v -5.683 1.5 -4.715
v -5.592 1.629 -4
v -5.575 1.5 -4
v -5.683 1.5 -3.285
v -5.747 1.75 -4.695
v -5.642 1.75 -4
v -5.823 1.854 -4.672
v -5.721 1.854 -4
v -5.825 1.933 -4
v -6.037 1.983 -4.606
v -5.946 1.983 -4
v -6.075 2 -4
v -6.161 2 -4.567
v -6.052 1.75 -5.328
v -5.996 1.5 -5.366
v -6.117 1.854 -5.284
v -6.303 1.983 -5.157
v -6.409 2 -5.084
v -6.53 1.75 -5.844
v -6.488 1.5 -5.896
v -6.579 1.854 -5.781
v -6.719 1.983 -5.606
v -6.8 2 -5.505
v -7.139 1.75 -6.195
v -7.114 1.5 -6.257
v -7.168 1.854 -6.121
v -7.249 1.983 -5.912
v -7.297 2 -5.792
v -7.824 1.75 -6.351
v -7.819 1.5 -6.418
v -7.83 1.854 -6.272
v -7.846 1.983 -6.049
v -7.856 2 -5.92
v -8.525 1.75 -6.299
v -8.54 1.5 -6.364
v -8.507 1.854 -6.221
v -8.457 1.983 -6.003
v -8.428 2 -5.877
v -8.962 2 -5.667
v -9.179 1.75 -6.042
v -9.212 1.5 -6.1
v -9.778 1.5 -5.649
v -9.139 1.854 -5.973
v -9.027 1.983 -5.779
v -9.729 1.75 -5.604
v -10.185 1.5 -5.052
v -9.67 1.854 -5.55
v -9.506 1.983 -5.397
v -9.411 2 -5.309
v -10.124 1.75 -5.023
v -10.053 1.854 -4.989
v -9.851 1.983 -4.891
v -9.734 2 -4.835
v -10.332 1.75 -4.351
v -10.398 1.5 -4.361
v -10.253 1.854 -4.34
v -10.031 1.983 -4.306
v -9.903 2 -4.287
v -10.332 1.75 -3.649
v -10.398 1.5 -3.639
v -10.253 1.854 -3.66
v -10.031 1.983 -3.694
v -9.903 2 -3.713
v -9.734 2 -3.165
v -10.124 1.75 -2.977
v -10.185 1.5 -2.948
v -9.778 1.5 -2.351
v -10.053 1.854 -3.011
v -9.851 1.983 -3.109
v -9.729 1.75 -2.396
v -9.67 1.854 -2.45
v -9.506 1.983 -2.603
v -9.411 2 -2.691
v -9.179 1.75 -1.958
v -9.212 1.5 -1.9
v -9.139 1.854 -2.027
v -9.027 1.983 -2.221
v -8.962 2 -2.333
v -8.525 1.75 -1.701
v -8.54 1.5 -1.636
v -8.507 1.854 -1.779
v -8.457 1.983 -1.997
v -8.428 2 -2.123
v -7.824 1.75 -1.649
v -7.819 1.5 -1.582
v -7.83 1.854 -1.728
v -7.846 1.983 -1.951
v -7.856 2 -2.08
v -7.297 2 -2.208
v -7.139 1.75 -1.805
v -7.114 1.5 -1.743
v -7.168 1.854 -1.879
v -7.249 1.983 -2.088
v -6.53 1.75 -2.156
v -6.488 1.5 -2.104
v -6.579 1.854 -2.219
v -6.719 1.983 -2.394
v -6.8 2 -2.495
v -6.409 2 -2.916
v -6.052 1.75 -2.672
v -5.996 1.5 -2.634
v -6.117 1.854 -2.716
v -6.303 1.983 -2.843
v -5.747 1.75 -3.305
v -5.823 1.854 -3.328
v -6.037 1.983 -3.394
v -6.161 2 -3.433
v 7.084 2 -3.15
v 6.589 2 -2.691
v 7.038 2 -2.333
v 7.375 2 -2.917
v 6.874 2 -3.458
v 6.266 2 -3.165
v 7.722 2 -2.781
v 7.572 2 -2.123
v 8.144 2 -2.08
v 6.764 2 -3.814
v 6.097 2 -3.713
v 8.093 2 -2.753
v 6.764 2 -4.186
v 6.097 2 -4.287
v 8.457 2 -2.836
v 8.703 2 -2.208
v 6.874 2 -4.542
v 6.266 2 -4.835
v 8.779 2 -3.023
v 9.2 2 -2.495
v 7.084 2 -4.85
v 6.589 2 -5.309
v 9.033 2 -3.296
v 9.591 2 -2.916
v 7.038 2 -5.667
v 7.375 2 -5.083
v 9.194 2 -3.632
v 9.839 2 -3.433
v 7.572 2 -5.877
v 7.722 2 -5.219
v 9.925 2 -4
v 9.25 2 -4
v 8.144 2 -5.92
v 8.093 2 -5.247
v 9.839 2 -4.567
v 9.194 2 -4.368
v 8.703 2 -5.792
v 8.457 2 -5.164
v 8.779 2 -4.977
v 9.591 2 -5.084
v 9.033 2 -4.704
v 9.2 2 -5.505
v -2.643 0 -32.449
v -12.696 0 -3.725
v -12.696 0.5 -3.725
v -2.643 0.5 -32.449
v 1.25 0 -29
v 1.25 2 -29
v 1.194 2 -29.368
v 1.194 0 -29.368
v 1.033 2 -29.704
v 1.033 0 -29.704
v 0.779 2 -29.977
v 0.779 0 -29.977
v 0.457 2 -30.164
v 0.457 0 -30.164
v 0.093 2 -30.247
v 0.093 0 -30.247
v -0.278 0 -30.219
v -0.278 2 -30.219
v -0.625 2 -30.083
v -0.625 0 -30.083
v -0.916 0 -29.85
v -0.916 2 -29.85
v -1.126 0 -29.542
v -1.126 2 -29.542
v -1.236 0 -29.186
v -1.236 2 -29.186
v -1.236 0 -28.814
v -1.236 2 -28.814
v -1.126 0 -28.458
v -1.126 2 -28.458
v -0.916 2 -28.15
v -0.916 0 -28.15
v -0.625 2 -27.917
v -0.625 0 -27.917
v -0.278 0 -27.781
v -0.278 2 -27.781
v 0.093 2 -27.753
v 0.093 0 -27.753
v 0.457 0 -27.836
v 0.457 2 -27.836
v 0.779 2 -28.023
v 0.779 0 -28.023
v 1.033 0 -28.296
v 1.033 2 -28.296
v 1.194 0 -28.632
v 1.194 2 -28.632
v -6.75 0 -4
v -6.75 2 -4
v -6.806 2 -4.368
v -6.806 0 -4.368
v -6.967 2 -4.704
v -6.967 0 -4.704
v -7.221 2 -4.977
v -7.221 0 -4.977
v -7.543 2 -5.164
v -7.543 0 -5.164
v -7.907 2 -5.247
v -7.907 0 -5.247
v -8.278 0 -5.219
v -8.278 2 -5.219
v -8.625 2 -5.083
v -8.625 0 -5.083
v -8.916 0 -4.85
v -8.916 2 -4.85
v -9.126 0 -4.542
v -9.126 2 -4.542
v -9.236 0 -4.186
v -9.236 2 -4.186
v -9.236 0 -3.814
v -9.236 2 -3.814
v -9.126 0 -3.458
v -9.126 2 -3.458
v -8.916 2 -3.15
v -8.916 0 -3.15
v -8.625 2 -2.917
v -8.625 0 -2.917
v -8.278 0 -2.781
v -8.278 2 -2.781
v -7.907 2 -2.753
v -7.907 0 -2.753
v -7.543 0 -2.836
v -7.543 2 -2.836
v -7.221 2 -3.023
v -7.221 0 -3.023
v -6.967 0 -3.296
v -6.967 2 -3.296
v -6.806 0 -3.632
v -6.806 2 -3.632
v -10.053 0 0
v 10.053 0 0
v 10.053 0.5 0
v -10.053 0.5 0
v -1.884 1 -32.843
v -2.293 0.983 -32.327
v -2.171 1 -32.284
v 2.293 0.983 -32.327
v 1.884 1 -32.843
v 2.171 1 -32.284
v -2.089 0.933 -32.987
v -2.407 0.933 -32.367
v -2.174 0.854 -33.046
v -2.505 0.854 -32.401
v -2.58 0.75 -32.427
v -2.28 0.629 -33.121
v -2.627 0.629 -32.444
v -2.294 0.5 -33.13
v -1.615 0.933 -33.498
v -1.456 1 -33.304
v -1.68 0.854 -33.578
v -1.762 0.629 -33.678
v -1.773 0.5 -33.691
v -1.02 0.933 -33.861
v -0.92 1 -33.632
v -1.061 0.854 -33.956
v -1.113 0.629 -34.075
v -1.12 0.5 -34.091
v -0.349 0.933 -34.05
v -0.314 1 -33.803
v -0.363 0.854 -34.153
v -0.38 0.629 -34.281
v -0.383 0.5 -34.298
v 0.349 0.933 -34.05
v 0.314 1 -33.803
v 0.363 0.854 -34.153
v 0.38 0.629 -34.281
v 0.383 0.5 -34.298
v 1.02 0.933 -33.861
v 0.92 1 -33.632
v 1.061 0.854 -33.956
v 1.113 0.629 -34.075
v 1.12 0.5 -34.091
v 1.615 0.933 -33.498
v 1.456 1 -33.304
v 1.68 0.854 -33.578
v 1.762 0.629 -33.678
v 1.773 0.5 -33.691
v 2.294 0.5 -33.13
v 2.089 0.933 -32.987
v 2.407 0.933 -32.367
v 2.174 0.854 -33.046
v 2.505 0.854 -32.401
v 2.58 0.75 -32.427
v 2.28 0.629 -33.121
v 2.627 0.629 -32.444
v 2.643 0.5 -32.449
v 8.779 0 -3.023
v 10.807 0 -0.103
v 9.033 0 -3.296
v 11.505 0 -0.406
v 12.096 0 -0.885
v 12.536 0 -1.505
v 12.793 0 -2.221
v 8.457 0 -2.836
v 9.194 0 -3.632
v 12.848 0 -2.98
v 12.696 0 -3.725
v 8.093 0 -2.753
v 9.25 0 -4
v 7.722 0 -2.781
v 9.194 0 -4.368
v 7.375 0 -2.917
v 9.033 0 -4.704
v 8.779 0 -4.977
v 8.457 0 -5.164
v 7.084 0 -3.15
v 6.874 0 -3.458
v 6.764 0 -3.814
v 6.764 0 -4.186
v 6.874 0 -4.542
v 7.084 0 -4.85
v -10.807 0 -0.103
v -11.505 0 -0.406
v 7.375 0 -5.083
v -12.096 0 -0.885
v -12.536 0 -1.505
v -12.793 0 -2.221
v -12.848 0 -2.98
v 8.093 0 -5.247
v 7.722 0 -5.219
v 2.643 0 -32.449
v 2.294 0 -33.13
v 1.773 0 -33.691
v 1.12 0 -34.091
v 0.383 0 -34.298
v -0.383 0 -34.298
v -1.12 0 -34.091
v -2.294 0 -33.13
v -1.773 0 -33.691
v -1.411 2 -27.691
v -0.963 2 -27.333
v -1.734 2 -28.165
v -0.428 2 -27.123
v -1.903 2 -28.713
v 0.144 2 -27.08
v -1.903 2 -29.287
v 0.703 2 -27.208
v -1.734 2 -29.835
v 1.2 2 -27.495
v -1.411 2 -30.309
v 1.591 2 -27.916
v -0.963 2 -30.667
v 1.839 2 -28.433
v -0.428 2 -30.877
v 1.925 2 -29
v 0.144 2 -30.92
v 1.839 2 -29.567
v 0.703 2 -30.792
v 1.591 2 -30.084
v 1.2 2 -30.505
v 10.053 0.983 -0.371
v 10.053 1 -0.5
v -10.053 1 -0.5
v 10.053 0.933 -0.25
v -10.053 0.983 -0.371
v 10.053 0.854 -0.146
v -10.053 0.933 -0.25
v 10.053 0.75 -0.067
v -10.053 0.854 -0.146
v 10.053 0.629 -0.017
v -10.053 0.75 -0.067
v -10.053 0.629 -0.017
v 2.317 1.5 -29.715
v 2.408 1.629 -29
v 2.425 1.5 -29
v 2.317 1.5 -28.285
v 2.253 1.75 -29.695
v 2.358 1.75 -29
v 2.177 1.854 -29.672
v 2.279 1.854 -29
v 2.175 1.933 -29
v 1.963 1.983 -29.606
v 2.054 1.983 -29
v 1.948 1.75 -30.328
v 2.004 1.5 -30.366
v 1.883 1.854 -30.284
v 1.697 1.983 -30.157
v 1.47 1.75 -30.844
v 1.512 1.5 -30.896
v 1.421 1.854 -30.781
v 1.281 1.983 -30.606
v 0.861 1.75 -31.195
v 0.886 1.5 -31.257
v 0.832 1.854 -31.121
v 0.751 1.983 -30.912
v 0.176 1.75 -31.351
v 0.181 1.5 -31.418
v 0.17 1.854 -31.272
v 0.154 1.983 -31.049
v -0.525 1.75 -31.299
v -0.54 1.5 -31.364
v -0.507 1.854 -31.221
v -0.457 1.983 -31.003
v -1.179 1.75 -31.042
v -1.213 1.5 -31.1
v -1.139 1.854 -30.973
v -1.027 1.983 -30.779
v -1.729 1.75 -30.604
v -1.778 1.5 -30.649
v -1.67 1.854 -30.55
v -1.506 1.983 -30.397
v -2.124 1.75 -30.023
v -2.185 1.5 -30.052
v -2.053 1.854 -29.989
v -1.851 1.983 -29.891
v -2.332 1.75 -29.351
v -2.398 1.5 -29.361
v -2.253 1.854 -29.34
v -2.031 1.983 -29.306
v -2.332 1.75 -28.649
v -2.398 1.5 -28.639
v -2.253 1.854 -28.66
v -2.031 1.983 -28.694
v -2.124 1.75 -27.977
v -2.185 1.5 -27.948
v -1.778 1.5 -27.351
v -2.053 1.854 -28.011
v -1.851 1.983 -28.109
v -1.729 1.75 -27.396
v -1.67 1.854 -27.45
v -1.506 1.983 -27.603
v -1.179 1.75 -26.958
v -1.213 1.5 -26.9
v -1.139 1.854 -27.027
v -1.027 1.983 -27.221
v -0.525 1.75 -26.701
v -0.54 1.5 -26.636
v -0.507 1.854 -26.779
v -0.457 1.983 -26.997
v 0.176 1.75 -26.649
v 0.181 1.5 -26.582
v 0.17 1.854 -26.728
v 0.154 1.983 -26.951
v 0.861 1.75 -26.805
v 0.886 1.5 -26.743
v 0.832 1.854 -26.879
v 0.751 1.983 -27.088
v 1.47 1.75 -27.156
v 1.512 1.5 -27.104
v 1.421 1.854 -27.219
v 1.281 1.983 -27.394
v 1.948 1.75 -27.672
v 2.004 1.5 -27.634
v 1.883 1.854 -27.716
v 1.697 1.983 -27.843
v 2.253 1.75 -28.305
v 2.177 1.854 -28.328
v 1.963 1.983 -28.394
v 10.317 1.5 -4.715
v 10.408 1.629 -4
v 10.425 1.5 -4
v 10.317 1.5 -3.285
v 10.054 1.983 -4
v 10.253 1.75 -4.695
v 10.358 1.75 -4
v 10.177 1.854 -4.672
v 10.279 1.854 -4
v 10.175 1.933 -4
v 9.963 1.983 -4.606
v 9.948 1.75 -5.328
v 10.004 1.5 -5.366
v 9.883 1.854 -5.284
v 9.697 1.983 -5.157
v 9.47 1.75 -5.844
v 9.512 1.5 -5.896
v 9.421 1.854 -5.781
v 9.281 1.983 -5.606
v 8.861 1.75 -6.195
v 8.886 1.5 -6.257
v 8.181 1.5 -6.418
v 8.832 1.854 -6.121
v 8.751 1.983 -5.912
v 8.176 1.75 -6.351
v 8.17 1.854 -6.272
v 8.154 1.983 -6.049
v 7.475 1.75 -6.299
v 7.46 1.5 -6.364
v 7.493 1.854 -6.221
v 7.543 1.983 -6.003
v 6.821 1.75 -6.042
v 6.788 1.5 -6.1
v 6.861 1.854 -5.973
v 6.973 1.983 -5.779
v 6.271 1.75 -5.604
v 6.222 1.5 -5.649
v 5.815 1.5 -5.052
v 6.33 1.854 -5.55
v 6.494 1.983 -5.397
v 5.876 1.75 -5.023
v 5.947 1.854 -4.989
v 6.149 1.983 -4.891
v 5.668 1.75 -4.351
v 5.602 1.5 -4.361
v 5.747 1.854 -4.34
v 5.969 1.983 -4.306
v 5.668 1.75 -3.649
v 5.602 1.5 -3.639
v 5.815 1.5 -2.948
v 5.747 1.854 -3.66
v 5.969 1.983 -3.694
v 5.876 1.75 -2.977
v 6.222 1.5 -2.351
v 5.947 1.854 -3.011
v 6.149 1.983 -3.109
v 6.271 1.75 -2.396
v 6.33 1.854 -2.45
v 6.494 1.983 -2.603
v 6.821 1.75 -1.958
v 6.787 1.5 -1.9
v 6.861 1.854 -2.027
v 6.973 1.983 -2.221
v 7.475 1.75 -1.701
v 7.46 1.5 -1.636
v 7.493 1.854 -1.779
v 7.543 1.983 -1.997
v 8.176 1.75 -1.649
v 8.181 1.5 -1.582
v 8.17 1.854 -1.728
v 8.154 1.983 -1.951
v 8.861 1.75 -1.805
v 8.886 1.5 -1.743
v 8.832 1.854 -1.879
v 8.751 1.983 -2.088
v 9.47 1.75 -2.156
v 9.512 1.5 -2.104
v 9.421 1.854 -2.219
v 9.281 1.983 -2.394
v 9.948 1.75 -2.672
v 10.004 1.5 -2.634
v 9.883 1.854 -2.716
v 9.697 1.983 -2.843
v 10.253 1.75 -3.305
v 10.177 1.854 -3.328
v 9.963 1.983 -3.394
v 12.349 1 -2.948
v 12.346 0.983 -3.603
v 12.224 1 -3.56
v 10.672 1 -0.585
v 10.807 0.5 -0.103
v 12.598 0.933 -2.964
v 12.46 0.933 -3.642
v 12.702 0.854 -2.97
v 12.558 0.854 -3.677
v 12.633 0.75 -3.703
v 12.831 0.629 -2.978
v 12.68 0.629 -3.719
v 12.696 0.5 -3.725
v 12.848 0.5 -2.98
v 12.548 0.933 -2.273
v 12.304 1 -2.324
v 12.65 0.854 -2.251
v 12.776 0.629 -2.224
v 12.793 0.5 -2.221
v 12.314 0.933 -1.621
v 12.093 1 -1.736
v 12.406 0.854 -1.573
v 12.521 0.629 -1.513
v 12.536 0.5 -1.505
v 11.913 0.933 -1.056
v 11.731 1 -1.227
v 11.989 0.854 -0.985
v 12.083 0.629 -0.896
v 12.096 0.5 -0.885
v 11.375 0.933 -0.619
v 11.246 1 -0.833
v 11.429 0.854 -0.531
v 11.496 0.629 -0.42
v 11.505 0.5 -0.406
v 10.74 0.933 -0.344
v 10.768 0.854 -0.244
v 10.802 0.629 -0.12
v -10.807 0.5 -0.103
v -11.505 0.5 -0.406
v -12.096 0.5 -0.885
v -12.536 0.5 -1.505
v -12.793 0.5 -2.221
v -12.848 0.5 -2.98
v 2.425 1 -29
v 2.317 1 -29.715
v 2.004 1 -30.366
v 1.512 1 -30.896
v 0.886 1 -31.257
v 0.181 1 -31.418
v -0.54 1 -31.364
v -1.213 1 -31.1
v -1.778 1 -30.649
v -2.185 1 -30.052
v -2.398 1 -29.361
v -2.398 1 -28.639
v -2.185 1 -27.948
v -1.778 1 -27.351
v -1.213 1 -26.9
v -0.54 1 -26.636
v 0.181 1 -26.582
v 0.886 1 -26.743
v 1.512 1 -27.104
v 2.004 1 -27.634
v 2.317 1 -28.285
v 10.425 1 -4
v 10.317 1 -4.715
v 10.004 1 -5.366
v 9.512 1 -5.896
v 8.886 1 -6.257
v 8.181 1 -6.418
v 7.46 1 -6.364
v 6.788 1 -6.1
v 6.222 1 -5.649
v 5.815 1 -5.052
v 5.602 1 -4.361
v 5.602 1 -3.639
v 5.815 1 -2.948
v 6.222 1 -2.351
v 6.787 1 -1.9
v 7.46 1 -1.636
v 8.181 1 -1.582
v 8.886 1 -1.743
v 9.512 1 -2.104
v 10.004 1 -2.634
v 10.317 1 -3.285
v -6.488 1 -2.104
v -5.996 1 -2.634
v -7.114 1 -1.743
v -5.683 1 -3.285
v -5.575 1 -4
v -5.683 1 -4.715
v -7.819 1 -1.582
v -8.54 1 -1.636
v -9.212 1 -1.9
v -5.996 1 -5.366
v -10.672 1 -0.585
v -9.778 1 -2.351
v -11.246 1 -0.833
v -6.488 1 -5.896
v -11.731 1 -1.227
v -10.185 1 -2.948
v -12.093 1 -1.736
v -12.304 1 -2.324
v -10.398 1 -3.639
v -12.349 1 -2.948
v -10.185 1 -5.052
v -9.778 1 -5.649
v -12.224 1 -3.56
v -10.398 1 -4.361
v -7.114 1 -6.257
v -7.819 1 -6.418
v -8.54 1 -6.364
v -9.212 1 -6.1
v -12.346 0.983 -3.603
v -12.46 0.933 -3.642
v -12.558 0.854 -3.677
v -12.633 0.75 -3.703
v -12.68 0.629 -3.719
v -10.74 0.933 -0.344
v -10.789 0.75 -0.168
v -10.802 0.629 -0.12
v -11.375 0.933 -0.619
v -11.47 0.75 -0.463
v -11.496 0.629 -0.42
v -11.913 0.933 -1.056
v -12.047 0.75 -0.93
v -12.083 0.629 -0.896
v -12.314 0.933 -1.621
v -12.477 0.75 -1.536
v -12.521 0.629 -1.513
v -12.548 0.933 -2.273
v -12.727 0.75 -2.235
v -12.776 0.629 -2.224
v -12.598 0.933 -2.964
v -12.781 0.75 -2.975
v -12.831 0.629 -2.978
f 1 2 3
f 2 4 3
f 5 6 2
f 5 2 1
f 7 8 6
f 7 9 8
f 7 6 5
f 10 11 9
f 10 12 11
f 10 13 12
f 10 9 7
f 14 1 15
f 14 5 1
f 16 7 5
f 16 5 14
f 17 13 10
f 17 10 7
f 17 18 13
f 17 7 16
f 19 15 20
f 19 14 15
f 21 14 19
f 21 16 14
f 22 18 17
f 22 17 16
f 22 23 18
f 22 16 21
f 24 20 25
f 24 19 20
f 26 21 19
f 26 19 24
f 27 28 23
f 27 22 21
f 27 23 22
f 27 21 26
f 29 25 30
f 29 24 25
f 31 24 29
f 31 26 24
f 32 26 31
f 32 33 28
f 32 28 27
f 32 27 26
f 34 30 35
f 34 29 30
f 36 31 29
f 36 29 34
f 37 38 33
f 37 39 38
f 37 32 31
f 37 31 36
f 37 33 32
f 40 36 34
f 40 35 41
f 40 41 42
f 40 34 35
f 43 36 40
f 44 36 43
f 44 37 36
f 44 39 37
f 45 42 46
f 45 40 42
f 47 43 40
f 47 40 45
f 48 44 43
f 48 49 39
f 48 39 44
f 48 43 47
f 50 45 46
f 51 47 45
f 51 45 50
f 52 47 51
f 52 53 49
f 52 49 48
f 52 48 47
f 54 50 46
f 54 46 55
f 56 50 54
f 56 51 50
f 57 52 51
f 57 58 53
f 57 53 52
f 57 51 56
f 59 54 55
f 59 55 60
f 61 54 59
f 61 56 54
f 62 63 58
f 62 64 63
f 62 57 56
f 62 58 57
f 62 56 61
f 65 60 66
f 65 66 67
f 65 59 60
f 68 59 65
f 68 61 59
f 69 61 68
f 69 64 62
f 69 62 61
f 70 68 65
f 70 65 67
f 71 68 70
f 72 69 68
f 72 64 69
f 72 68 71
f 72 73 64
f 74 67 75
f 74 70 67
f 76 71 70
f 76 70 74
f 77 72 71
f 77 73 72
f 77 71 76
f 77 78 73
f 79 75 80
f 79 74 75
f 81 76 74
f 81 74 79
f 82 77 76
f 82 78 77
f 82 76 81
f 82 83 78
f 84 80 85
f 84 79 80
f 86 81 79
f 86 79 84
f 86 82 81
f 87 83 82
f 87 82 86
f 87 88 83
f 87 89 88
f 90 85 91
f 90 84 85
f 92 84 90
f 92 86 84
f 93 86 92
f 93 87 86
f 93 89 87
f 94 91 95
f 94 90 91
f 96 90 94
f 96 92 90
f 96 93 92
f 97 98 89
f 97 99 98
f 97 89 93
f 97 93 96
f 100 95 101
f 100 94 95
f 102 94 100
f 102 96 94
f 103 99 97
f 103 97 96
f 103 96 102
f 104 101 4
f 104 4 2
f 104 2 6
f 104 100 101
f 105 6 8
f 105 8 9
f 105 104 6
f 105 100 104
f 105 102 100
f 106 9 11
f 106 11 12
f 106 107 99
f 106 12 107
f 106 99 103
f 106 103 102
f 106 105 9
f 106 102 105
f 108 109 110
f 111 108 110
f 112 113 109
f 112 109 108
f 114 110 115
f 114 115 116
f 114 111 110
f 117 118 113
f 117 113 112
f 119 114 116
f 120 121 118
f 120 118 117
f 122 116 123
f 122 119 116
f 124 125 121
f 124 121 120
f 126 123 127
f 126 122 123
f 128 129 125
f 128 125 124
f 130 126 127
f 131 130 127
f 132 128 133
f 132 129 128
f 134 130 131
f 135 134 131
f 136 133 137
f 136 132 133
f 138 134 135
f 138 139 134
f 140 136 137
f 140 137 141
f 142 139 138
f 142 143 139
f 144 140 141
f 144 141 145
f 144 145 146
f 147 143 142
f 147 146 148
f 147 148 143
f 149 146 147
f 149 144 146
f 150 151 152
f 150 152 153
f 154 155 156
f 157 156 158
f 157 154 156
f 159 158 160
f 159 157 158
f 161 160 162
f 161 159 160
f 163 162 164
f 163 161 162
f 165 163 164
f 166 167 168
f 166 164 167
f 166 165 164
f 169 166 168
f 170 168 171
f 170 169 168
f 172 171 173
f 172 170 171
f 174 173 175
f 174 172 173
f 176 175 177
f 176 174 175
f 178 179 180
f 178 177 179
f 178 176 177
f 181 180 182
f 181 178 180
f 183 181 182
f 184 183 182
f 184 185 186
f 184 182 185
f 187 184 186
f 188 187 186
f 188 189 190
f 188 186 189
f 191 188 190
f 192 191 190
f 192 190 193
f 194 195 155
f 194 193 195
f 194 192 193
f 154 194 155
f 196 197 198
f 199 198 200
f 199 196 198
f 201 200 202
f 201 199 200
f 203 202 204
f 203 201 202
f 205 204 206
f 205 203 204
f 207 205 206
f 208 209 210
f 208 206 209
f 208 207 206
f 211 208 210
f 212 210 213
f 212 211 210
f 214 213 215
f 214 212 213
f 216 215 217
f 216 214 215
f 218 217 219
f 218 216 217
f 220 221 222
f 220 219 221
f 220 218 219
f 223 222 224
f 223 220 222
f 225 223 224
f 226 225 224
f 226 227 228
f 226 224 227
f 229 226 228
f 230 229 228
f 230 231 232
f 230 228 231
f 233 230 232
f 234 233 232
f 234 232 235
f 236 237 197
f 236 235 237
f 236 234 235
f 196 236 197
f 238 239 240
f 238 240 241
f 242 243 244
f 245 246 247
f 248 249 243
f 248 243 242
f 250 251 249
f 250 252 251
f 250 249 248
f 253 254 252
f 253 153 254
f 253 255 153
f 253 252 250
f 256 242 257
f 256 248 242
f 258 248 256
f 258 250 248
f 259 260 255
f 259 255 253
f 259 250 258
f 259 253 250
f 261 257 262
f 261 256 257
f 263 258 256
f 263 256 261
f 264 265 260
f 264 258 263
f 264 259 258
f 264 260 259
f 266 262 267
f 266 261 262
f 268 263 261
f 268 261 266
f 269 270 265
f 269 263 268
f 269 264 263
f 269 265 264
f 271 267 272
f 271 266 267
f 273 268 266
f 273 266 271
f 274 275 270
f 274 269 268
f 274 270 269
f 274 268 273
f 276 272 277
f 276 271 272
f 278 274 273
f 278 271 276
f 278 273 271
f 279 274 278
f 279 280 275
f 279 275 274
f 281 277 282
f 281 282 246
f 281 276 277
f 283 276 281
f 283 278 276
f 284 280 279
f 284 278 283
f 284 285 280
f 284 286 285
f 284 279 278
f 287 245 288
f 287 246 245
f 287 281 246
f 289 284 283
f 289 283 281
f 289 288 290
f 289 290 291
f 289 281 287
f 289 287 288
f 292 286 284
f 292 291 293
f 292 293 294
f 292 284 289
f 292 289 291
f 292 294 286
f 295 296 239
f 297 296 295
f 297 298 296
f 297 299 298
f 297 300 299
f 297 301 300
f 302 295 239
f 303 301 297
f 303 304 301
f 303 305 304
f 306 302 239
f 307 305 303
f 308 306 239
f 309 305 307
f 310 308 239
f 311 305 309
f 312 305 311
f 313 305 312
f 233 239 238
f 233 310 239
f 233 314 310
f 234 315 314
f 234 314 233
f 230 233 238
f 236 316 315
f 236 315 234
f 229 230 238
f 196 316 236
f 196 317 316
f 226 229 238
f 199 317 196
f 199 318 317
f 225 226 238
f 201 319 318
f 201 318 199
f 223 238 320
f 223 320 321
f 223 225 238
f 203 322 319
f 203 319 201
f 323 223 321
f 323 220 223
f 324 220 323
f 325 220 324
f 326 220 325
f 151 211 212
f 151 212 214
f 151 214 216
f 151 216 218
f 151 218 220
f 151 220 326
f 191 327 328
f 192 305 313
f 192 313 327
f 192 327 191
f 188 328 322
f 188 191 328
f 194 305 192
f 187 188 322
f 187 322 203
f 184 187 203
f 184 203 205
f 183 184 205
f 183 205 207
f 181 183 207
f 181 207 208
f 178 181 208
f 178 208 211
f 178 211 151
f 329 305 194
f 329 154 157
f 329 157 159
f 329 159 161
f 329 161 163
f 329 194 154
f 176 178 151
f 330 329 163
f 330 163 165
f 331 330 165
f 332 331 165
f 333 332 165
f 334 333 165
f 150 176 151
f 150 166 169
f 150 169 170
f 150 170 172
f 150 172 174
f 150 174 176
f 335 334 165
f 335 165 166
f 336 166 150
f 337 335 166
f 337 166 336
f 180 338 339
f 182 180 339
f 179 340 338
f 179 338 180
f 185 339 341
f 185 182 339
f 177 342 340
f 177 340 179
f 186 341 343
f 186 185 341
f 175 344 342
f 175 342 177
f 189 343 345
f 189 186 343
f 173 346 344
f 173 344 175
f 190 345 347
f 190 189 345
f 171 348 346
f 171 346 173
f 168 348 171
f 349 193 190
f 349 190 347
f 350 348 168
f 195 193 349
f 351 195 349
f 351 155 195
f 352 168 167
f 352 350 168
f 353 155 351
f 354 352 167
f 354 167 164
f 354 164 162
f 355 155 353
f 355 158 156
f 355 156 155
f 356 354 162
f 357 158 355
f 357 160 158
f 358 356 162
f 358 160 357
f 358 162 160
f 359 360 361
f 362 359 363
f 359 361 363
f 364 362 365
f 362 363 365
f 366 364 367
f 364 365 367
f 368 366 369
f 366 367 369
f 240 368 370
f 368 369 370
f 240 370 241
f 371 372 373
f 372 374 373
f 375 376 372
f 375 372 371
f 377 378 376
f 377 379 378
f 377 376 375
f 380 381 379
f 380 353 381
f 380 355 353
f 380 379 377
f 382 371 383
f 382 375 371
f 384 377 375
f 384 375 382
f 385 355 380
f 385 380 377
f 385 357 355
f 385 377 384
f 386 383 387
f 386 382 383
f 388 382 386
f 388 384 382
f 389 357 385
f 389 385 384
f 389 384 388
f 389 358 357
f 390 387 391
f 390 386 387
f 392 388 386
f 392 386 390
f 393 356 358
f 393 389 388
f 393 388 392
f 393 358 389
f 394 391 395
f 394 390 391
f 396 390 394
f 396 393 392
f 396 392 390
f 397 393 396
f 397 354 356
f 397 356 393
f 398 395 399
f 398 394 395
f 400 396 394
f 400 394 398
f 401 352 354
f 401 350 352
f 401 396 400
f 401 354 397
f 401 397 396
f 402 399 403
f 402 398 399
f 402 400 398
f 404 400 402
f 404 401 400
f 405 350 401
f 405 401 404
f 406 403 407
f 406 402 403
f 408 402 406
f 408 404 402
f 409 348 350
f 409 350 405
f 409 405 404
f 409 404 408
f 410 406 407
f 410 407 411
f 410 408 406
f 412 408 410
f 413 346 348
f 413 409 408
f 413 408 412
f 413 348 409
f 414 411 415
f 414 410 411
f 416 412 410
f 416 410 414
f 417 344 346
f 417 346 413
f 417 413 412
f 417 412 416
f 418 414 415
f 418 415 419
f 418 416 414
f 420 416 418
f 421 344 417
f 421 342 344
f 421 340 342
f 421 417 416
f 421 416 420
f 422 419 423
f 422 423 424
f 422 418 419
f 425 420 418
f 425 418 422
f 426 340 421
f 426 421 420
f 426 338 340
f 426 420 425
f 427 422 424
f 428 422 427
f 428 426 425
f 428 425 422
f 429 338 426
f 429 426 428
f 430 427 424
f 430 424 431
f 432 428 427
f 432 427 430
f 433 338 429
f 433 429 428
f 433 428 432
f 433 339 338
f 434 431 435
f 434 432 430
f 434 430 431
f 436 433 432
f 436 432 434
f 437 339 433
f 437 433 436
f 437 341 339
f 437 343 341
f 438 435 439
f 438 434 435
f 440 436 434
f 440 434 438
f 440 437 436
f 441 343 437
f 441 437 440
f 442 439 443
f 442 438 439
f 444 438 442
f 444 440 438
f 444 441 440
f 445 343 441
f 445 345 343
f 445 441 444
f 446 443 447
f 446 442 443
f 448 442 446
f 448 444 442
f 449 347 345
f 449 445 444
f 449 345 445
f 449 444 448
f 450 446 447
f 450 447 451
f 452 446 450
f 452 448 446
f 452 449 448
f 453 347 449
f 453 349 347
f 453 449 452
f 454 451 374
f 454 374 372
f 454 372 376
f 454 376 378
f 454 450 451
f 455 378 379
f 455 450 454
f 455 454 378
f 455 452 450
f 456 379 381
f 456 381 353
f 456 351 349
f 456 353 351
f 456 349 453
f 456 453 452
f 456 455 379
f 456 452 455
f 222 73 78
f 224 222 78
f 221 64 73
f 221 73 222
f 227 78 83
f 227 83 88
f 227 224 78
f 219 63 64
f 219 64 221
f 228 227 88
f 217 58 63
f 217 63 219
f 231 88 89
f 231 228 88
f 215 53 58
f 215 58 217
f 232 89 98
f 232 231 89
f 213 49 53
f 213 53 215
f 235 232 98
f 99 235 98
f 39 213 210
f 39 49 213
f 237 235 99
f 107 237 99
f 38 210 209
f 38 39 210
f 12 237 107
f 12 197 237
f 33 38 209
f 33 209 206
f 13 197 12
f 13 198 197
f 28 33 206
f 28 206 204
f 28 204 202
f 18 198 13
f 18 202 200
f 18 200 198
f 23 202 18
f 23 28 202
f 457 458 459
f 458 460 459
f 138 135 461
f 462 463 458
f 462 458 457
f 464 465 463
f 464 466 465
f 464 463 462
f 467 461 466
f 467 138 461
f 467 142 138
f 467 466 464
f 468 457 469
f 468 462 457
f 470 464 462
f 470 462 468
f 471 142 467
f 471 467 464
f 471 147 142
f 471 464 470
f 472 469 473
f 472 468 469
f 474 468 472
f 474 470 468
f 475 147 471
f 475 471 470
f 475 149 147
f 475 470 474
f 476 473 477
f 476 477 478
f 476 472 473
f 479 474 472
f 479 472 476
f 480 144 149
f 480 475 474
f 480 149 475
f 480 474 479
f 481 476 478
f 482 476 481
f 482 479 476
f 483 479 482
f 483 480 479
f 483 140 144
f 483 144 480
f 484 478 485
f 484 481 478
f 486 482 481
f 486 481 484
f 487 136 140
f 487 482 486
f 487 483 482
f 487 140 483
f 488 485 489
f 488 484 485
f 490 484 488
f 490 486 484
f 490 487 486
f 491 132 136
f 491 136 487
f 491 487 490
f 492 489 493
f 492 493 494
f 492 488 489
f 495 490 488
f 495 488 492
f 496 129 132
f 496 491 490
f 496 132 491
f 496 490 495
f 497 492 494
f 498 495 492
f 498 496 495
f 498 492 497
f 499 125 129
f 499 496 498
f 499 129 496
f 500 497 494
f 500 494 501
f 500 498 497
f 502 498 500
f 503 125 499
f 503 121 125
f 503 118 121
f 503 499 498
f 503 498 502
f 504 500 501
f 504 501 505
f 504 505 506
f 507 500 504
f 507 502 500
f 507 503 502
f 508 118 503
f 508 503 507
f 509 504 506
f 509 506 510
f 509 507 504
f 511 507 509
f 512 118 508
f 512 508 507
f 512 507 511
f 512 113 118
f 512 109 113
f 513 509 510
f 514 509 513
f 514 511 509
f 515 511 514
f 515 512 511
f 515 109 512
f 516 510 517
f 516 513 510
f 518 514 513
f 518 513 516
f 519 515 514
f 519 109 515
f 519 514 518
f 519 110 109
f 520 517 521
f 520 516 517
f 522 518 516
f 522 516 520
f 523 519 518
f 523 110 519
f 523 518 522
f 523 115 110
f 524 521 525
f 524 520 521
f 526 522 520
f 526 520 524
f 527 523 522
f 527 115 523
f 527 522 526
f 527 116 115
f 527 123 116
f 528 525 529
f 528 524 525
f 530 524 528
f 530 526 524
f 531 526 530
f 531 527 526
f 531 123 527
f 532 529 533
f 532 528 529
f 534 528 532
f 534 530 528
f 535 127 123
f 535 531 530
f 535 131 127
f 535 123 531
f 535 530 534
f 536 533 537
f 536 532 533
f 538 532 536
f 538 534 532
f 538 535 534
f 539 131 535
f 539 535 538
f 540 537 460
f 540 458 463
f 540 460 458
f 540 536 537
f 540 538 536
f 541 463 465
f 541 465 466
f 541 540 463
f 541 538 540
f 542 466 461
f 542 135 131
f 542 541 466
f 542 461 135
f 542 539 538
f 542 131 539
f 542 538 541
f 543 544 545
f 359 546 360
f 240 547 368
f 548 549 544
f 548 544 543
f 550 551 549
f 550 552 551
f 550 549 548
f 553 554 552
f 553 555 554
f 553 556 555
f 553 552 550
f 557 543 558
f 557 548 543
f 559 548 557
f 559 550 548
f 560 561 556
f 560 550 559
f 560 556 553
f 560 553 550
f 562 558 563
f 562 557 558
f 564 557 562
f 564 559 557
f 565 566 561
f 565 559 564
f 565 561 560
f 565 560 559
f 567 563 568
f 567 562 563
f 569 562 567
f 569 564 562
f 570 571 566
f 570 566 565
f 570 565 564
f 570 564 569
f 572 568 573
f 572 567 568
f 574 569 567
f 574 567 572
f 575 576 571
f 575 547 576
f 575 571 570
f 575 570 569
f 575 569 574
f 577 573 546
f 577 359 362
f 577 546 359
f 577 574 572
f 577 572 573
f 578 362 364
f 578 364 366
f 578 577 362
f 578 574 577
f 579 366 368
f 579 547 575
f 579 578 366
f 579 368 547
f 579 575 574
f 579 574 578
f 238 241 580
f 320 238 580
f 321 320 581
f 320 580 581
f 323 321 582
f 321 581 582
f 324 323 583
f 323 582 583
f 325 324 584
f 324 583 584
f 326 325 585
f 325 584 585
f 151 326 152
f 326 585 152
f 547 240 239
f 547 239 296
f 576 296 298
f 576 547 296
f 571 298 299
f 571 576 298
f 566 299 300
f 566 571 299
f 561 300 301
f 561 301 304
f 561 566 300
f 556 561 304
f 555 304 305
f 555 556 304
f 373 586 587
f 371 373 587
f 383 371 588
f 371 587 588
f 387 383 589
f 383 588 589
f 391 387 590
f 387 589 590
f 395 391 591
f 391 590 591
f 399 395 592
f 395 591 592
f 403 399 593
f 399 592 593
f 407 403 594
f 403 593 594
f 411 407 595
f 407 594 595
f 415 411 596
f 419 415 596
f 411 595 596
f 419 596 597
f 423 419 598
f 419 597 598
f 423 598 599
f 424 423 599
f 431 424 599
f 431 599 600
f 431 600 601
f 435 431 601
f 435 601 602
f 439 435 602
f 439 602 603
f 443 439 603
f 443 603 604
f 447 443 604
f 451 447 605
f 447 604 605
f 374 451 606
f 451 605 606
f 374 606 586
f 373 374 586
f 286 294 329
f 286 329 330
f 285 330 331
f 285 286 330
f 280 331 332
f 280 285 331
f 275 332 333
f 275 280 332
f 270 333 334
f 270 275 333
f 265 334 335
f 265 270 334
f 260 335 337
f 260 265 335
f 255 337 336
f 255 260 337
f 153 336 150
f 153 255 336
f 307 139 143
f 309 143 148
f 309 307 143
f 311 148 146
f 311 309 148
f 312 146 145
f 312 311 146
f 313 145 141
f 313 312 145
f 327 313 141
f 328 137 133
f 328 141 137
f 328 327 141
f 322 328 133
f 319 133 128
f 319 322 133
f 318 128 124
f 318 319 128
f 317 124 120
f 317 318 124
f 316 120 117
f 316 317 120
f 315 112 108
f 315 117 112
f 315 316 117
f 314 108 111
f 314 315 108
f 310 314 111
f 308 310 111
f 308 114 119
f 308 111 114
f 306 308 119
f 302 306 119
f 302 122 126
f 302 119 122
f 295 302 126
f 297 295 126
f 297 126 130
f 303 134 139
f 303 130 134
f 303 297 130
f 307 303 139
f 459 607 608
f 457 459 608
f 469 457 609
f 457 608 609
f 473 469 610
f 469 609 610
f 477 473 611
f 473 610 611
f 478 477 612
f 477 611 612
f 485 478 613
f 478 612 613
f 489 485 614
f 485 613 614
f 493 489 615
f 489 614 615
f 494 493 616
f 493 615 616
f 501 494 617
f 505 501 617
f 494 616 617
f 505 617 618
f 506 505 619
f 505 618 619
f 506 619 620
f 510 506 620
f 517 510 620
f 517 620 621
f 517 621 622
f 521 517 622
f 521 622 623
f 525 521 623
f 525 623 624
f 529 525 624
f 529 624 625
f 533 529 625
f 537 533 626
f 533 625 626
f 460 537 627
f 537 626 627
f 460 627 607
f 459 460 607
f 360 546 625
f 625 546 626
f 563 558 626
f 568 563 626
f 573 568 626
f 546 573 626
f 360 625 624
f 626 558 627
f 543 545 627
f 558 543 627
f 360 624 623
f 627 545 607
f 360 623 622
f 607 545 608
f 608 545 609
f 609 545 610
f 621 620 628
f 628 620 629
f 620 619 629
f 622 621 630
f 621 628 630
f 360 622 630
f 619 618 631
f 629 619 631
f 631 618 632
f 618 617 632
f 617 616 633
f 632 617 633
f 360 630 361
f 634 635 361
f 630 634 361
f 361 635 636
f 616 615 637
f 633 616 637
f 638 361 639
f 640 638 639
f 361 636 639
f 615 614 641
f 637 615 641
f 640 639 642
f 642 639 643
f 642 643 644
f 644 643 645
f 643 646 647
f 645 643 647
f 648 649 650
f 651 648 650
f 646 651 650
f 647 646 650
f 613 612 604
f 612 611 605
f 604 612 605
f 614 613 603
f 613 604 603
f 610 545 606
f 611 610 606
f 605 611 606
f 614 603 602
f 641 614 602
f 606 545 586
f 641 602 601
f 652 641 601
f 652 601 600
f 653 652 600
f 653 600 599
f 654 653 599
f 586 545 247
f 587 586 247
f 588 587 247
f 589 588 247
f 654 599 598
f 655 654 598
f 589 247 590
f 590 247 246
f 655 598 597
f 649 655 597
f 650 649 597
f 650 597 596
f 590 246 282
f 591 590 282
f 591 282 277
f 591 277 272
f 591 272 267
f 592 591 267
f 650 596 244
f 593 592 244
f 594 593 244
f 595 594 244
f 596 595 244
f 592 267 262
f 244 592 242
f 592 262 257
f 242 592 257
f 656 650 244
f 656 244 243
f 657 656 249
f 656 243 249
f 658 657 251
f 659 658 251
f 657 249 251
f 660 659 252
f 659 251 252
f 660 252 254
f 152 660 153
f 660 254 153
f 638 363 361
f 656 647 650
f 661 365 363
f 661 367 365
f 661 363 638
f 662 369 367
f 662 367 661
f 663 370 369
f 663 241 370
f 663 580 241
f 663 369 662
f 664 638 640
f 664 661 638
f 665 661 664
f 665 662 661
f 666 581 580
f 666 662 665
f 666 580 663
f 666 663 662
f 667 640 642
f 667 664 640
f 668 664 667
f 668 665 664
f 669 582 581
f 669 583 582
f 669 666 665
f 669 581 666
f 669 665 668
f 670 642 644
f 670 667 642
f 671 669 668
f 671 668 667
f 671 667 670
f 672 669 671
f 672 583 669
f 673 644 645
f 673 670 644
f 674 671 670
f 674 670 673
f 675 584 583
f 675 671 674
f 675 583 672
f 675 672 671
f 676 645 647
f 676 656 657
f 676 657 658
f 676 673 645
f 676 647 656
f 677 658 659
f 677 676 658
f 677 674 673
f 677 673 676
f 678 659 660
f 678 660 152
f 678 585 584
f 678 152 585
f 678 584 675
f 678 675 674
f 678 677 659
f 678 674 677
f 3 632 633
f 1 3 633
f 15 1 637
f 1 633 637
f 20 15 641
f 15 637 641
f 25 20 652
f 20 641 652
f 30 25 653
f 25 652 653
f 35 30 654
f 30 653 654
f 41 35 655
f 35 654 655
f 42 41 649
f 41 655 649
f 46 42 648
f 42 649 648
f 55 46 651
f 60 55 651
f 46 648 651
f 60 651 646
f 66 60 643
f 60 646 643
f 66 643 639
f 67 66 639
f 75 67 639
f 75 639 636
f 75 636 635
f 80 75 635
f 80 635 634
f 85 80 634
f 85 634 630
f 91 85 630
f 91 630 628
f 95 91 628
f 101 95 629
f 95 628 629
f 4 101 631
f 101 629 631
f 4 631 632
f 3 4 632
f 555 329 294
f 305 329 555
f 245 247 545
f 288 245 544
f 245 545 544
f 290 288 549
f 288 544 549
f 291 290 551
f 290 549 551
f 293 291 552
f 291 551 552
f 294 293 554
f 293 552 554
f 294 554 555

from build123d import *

# Parameters (mm, degrees)
BOSS_EXTRUDE1_DEPTH     = 1
BOSS_EXTRUDE3_START     = 1
SKETCH2_R               = 2.425
BOSS_EXTRUDE3_DEPTH     = 1
SKETCH3_R               = 1.25
CUT_EXTRUDE2_DEPTH      = 3
CUT_EXTRUDE2_DEPTH_BACK = 1
FILLET2_R               = 2.8
FILLET3_R               = 0.5


with BuildPart() as part:
    # Sketch1 → Boss-Extrude1 (new body)
    with BuildSketch(Plane(origin=(0, 0, 0), x_dir=(1, 0, 0), z_dir=(0, 1, 0))):
        Polygon((14, 0), (-14, 0), (0, 40), align=None)
    extrude(amount=BOSS_EXTRUDE1_DEPTH)

    # Sketch2 → Boss-Extrude3 (add)
    with BuildSketch(Plane(origin=(0, 0, 0), x_dir=(1, 0, 0), z_dir=(0, 1, 0)).offset(BOSS_EXTRUDE3_START)):
        with Locations((-8, 4)):
            Circle(SKETCH2_R)
        with Locations((0, 29)):
            Circle(SKETCH2_R)
        with Locations((8, 4)):
            Circle(SKETCH2_R)
    extrude(amount=BOSS_EXTRUDE3_DEPTH)

    # Sketch3 → Cut-Extrude2 (cut, two sides)
    with BuildSketch(Plane(origin=(0, 0, 0), x_dir=(1, 0, 0), z_dir=(0, 1, 0))) as cut_extrude2_sk:
        with Locations((0, 29)):
            Circle(SKETCH3_R)
        with Locations((-8, 4)):
            Circle(SKETCH3_R)
        with Locations((8, 4)):
            Circle(SKETCH3_R)
    extrude(amount=CUT_EXTRUDE2_DEPTH, mode=Mode.SUBTRACT)
    extrude(cut_extrude2_sk.sketch, amount=-CUT_EXTRUDE2_DEPTH_BACK, mode=Mode.SUBTRACT)

    # Fillet2
    fillet2_edges = [part.edges().sort_by_distance(p)[0] for p in [
        (0, 0.5, -40),
        (14, 0.5, 0),
        (-14, 0.5, 0),
    ]]
    fillet(fillet2_edges, radius=FILLET2_R)

    # Fillet3
    fillet3_edges = [part.edges().sort_by_distance(p)[0] for p in [
        (-10.425, 2, -4),
        (-2.425, 2, -29),
        (5.575, 2, -4),
        (-7.669529991, 1, -18.087057169),
        (7.669529991, 1, -18.087057169),
        (0, 1, 0),
        (-12.337084869, 1, -1.179806698),
        (12.337084869, 1, -1.179806698),
        (0, 1, -34.32415196),
    ]]
    fillet(fillet3_edges, radius=FILLET3_R)


solid = part.part
